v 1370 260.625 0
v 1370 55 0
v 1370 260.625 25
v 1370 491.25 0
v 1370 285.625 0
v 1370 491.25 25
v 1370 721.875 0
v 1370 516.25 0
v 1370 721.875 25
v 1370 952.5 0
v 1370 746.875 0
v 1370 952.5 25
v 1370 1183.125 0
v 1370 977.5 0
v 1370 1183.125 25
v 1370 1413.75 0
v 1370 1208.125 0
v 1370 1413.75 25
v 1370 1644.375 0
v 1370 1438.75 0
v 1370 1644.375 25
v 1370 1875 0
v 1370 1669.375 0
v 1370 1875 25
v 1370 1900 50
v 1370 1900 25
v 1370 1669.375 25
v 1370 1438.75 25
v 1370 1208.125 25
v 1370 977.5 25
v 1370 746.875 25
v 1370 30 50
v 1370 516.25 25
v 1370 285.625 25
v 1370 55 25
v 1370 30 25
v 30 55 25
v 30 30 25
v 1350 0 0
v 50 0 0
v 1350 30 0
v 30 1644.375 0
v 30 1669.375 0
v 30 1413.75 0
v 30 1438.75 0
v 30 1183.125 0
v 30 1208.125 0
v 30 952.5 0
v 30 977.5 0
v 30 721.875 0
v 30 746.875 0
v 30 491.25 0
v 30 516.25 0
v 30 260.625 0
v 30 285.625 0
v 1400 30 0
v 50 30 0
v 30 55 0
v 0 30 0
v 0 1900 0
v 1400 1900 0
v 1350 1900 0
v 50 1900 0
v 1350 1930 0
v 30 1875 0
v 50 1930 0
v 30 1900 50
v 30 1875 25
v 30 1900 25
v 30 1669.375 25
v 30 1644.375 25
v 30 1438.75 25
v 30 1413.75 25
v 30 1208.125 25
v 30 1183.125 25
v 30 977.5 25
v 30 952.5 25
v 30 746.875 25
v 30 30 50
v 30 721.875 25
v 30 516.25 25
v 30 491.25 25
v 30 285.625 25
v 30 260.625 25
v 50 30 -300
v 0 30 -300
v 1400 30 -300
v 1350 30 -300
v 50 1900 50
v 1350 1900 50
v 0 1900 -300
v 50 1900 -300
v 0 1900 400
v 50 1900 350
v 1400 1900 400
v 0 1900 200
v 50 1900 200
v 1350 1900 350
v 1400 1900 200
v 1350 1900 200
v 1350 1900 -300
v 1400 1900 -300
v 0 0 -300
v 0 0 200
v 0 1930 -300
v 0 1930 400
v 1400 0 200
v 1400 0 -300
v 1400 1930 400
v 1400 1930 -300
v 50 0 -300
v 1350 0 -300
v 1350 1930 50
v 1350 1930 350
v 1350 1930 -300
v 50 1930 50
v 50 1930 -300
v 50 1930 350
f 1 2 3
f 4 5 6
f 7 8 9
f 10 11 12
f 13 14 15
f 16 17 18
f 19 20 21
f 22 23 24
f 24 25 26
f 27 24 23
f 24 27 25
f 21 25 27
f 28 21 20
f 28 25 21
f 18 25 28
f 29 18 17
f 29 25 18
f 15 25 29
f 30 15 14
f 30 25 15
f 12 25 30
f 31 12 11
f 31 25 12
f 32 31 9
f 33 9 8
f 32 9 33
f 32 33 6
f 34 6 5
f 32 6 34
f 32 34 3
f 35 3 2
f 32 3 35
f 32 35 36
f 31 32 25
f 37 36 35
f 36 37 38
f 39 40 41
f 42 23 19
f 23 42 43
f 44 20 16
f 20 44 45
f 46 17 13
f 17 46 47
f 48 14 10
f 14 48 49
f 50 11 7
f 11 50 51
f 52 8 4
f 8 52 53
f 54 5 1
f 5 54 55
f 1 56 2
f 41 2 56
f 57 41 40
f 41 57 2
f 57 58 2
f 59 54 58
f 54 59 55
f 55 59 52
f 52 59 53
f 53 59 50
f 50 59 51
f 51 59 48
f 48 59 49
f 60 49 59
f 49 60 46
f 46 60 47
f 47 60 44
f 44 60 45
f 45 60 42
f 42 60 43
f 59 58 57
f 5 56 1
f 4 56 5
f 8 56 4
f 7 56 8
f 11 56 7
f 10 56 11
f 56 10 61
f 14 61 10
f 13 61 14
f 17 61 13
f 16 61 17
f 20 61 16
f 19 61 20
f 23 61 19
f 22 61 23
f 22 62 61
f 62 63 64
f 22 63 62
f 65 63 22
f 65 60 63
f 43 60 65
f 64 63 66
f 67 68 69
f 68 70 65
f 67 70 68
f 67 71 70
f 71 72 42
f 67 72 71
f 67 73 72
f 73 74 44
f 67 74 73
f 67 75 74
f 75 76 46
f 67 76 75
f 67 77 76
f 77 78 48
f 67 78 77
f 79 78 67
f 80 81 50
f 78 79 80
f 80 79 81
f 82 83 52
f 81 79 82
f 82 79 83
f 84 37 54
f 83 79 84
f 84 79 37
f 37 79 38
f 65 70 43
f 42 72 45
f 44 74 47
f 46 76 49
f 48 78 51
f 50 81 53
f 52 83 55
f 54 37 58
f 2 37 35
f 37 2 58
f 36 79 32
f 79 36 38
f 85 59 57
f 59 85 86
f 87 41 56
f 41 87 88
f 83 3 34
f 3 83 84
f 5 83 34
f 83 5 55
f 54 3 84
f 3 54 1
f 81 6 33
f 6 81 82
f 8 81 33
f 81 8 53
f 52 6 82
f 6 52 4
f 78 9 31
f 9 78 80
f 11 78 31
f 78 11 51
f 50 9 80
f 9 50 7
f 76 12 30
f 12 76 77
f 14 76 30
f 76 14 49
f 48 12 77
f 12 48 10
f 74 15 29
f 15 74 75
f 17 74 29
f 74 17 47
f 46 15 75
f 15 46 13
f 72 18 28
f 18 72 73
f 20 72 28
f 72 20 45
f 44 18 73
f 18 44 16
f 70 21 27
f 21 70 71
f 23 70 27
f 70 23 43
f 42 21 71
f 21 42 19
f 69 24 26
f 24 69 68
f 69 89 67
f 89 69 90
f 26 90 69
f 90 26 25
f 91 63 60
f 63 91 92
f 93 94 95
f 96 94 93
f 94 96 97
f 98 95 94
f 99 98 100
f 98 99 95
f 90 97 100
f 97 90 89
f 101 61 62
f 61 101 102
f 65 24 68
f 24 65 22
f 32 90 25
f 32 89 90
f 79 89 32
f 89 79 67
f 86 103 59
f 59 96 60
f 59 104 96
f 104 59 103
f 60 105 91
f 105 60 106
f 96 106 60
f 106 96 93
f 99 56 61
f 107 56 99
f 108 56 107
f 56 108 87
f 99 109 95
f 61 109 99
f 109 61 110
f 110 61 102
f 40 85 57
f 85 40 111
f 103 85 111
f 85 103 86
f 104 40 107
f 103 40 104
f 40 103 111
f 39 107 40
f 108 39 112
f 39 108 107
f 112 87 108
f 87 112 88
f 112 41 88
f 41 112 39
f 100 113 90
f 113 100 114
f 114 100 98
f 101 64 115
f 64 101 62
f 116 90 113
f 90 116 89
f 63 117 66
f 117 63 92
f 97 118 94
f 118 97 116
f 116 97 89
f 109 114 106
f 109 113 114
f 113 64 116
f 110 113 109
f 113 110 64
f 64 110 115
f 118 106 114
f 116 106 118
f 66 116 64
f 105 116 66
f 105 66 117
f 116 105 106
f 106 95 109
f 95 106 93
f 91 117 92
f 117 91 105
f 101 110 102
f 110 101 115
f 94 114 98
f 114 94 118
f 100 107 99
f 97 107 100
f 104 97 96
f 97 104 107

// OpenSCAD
main_h = 30;
main_w = 50;

travessa_h = 25;
travessa_w = 25;

mattress_w = 1400;
mattress_l = 1900;
mattress_h = 150;

foot_h = 300;
footer_h = foot_h + main_w;
header_h = 700;

folga = 0;

estrado_h = 15;

WHITE = [ 1.0, 1.0, 1.0 ];
BLACK = [ 0.0, 0.0, 0.0 ];

N = 9;

del = ( mattress_l + folga - N * travessa_h - main_h ) / ( N - 1 );
echo( del );
echo( N * ( mattress_w + folga ) );

    // Laterais:
    
    translate( [ 0, main_h, 0 ] )
        color( BLACK ) cube( [ main_h, mattress_l + folga - main_h, main_w ] );
    
    translate( [ mattress_w + folga - main_h, main_h, 0 ] )
        color( BLACK ) cube( [ main_h, mattress_l + folga - main_h, main_w ] );
    
    // "pezeira":
    translate( [ 0, 0, -foot_h ] )
        color( BLACK ) cube( [ main_w, main_h, footer_h ] );
    translate( [ mattress_w + folga - main_w, 0, -foot_h ] )
        color( BLACK ) cube( [ main_w, main_h, footer_h ] );
    
    // Transversais:
    translate( [ main_w, 0, 0 ] )
        color( BLACK ) cube( [ mattress_w + folga - 2 * main_w, main_h, main_w ] );
    translate( [ main_w, mattress_l + folga, 0 ] )
        color( BLACK ) cube( [ mattress_w + folga - 2 * main_w, main_h, main_w ] );
        
    // Cabeceira:
    translate( [ 0, mattress_l + folga, -foot_h ] )
        color( BLACK ) cube( [ main_w, main_h, header_h ] );
    translate( [ mattress_w + folga - main_w, mattress_l + folga, -foot_h ] )
        color( BLACK ) cube( [ main_w, main_h, header_h ] );
    translate( [ 0, mattress_l + folga, header_h - foot_h - main_w ] )
        color( BLACK ) cube( [ mattress_w + folga, main_h, main_w ] );

    
    echo( 2 * ( mattress_l + folga ) + 2 * footer_h + 2 * header_h + 2 * ( mattress_w + folga - 2 * ( main_w - main_h ) ) );
    
    // Colchão:
    color( WHITE )
        translate( [ folga / 2, folga / 2, main_w ] )
            cube( [ mattress_w, mattress_l, mattress_h ] );
            
    // Estrado:
    for ( i = [ 0 : N - 1 ] ) {
            translate( [ main_h, main_h + i * ( del + travessa_h ), 0 ] )
                color( BLACK ) cube( [ mattress_w + folga - 2 * main_h, travessa_h, travessa_w ] );
    }
    
